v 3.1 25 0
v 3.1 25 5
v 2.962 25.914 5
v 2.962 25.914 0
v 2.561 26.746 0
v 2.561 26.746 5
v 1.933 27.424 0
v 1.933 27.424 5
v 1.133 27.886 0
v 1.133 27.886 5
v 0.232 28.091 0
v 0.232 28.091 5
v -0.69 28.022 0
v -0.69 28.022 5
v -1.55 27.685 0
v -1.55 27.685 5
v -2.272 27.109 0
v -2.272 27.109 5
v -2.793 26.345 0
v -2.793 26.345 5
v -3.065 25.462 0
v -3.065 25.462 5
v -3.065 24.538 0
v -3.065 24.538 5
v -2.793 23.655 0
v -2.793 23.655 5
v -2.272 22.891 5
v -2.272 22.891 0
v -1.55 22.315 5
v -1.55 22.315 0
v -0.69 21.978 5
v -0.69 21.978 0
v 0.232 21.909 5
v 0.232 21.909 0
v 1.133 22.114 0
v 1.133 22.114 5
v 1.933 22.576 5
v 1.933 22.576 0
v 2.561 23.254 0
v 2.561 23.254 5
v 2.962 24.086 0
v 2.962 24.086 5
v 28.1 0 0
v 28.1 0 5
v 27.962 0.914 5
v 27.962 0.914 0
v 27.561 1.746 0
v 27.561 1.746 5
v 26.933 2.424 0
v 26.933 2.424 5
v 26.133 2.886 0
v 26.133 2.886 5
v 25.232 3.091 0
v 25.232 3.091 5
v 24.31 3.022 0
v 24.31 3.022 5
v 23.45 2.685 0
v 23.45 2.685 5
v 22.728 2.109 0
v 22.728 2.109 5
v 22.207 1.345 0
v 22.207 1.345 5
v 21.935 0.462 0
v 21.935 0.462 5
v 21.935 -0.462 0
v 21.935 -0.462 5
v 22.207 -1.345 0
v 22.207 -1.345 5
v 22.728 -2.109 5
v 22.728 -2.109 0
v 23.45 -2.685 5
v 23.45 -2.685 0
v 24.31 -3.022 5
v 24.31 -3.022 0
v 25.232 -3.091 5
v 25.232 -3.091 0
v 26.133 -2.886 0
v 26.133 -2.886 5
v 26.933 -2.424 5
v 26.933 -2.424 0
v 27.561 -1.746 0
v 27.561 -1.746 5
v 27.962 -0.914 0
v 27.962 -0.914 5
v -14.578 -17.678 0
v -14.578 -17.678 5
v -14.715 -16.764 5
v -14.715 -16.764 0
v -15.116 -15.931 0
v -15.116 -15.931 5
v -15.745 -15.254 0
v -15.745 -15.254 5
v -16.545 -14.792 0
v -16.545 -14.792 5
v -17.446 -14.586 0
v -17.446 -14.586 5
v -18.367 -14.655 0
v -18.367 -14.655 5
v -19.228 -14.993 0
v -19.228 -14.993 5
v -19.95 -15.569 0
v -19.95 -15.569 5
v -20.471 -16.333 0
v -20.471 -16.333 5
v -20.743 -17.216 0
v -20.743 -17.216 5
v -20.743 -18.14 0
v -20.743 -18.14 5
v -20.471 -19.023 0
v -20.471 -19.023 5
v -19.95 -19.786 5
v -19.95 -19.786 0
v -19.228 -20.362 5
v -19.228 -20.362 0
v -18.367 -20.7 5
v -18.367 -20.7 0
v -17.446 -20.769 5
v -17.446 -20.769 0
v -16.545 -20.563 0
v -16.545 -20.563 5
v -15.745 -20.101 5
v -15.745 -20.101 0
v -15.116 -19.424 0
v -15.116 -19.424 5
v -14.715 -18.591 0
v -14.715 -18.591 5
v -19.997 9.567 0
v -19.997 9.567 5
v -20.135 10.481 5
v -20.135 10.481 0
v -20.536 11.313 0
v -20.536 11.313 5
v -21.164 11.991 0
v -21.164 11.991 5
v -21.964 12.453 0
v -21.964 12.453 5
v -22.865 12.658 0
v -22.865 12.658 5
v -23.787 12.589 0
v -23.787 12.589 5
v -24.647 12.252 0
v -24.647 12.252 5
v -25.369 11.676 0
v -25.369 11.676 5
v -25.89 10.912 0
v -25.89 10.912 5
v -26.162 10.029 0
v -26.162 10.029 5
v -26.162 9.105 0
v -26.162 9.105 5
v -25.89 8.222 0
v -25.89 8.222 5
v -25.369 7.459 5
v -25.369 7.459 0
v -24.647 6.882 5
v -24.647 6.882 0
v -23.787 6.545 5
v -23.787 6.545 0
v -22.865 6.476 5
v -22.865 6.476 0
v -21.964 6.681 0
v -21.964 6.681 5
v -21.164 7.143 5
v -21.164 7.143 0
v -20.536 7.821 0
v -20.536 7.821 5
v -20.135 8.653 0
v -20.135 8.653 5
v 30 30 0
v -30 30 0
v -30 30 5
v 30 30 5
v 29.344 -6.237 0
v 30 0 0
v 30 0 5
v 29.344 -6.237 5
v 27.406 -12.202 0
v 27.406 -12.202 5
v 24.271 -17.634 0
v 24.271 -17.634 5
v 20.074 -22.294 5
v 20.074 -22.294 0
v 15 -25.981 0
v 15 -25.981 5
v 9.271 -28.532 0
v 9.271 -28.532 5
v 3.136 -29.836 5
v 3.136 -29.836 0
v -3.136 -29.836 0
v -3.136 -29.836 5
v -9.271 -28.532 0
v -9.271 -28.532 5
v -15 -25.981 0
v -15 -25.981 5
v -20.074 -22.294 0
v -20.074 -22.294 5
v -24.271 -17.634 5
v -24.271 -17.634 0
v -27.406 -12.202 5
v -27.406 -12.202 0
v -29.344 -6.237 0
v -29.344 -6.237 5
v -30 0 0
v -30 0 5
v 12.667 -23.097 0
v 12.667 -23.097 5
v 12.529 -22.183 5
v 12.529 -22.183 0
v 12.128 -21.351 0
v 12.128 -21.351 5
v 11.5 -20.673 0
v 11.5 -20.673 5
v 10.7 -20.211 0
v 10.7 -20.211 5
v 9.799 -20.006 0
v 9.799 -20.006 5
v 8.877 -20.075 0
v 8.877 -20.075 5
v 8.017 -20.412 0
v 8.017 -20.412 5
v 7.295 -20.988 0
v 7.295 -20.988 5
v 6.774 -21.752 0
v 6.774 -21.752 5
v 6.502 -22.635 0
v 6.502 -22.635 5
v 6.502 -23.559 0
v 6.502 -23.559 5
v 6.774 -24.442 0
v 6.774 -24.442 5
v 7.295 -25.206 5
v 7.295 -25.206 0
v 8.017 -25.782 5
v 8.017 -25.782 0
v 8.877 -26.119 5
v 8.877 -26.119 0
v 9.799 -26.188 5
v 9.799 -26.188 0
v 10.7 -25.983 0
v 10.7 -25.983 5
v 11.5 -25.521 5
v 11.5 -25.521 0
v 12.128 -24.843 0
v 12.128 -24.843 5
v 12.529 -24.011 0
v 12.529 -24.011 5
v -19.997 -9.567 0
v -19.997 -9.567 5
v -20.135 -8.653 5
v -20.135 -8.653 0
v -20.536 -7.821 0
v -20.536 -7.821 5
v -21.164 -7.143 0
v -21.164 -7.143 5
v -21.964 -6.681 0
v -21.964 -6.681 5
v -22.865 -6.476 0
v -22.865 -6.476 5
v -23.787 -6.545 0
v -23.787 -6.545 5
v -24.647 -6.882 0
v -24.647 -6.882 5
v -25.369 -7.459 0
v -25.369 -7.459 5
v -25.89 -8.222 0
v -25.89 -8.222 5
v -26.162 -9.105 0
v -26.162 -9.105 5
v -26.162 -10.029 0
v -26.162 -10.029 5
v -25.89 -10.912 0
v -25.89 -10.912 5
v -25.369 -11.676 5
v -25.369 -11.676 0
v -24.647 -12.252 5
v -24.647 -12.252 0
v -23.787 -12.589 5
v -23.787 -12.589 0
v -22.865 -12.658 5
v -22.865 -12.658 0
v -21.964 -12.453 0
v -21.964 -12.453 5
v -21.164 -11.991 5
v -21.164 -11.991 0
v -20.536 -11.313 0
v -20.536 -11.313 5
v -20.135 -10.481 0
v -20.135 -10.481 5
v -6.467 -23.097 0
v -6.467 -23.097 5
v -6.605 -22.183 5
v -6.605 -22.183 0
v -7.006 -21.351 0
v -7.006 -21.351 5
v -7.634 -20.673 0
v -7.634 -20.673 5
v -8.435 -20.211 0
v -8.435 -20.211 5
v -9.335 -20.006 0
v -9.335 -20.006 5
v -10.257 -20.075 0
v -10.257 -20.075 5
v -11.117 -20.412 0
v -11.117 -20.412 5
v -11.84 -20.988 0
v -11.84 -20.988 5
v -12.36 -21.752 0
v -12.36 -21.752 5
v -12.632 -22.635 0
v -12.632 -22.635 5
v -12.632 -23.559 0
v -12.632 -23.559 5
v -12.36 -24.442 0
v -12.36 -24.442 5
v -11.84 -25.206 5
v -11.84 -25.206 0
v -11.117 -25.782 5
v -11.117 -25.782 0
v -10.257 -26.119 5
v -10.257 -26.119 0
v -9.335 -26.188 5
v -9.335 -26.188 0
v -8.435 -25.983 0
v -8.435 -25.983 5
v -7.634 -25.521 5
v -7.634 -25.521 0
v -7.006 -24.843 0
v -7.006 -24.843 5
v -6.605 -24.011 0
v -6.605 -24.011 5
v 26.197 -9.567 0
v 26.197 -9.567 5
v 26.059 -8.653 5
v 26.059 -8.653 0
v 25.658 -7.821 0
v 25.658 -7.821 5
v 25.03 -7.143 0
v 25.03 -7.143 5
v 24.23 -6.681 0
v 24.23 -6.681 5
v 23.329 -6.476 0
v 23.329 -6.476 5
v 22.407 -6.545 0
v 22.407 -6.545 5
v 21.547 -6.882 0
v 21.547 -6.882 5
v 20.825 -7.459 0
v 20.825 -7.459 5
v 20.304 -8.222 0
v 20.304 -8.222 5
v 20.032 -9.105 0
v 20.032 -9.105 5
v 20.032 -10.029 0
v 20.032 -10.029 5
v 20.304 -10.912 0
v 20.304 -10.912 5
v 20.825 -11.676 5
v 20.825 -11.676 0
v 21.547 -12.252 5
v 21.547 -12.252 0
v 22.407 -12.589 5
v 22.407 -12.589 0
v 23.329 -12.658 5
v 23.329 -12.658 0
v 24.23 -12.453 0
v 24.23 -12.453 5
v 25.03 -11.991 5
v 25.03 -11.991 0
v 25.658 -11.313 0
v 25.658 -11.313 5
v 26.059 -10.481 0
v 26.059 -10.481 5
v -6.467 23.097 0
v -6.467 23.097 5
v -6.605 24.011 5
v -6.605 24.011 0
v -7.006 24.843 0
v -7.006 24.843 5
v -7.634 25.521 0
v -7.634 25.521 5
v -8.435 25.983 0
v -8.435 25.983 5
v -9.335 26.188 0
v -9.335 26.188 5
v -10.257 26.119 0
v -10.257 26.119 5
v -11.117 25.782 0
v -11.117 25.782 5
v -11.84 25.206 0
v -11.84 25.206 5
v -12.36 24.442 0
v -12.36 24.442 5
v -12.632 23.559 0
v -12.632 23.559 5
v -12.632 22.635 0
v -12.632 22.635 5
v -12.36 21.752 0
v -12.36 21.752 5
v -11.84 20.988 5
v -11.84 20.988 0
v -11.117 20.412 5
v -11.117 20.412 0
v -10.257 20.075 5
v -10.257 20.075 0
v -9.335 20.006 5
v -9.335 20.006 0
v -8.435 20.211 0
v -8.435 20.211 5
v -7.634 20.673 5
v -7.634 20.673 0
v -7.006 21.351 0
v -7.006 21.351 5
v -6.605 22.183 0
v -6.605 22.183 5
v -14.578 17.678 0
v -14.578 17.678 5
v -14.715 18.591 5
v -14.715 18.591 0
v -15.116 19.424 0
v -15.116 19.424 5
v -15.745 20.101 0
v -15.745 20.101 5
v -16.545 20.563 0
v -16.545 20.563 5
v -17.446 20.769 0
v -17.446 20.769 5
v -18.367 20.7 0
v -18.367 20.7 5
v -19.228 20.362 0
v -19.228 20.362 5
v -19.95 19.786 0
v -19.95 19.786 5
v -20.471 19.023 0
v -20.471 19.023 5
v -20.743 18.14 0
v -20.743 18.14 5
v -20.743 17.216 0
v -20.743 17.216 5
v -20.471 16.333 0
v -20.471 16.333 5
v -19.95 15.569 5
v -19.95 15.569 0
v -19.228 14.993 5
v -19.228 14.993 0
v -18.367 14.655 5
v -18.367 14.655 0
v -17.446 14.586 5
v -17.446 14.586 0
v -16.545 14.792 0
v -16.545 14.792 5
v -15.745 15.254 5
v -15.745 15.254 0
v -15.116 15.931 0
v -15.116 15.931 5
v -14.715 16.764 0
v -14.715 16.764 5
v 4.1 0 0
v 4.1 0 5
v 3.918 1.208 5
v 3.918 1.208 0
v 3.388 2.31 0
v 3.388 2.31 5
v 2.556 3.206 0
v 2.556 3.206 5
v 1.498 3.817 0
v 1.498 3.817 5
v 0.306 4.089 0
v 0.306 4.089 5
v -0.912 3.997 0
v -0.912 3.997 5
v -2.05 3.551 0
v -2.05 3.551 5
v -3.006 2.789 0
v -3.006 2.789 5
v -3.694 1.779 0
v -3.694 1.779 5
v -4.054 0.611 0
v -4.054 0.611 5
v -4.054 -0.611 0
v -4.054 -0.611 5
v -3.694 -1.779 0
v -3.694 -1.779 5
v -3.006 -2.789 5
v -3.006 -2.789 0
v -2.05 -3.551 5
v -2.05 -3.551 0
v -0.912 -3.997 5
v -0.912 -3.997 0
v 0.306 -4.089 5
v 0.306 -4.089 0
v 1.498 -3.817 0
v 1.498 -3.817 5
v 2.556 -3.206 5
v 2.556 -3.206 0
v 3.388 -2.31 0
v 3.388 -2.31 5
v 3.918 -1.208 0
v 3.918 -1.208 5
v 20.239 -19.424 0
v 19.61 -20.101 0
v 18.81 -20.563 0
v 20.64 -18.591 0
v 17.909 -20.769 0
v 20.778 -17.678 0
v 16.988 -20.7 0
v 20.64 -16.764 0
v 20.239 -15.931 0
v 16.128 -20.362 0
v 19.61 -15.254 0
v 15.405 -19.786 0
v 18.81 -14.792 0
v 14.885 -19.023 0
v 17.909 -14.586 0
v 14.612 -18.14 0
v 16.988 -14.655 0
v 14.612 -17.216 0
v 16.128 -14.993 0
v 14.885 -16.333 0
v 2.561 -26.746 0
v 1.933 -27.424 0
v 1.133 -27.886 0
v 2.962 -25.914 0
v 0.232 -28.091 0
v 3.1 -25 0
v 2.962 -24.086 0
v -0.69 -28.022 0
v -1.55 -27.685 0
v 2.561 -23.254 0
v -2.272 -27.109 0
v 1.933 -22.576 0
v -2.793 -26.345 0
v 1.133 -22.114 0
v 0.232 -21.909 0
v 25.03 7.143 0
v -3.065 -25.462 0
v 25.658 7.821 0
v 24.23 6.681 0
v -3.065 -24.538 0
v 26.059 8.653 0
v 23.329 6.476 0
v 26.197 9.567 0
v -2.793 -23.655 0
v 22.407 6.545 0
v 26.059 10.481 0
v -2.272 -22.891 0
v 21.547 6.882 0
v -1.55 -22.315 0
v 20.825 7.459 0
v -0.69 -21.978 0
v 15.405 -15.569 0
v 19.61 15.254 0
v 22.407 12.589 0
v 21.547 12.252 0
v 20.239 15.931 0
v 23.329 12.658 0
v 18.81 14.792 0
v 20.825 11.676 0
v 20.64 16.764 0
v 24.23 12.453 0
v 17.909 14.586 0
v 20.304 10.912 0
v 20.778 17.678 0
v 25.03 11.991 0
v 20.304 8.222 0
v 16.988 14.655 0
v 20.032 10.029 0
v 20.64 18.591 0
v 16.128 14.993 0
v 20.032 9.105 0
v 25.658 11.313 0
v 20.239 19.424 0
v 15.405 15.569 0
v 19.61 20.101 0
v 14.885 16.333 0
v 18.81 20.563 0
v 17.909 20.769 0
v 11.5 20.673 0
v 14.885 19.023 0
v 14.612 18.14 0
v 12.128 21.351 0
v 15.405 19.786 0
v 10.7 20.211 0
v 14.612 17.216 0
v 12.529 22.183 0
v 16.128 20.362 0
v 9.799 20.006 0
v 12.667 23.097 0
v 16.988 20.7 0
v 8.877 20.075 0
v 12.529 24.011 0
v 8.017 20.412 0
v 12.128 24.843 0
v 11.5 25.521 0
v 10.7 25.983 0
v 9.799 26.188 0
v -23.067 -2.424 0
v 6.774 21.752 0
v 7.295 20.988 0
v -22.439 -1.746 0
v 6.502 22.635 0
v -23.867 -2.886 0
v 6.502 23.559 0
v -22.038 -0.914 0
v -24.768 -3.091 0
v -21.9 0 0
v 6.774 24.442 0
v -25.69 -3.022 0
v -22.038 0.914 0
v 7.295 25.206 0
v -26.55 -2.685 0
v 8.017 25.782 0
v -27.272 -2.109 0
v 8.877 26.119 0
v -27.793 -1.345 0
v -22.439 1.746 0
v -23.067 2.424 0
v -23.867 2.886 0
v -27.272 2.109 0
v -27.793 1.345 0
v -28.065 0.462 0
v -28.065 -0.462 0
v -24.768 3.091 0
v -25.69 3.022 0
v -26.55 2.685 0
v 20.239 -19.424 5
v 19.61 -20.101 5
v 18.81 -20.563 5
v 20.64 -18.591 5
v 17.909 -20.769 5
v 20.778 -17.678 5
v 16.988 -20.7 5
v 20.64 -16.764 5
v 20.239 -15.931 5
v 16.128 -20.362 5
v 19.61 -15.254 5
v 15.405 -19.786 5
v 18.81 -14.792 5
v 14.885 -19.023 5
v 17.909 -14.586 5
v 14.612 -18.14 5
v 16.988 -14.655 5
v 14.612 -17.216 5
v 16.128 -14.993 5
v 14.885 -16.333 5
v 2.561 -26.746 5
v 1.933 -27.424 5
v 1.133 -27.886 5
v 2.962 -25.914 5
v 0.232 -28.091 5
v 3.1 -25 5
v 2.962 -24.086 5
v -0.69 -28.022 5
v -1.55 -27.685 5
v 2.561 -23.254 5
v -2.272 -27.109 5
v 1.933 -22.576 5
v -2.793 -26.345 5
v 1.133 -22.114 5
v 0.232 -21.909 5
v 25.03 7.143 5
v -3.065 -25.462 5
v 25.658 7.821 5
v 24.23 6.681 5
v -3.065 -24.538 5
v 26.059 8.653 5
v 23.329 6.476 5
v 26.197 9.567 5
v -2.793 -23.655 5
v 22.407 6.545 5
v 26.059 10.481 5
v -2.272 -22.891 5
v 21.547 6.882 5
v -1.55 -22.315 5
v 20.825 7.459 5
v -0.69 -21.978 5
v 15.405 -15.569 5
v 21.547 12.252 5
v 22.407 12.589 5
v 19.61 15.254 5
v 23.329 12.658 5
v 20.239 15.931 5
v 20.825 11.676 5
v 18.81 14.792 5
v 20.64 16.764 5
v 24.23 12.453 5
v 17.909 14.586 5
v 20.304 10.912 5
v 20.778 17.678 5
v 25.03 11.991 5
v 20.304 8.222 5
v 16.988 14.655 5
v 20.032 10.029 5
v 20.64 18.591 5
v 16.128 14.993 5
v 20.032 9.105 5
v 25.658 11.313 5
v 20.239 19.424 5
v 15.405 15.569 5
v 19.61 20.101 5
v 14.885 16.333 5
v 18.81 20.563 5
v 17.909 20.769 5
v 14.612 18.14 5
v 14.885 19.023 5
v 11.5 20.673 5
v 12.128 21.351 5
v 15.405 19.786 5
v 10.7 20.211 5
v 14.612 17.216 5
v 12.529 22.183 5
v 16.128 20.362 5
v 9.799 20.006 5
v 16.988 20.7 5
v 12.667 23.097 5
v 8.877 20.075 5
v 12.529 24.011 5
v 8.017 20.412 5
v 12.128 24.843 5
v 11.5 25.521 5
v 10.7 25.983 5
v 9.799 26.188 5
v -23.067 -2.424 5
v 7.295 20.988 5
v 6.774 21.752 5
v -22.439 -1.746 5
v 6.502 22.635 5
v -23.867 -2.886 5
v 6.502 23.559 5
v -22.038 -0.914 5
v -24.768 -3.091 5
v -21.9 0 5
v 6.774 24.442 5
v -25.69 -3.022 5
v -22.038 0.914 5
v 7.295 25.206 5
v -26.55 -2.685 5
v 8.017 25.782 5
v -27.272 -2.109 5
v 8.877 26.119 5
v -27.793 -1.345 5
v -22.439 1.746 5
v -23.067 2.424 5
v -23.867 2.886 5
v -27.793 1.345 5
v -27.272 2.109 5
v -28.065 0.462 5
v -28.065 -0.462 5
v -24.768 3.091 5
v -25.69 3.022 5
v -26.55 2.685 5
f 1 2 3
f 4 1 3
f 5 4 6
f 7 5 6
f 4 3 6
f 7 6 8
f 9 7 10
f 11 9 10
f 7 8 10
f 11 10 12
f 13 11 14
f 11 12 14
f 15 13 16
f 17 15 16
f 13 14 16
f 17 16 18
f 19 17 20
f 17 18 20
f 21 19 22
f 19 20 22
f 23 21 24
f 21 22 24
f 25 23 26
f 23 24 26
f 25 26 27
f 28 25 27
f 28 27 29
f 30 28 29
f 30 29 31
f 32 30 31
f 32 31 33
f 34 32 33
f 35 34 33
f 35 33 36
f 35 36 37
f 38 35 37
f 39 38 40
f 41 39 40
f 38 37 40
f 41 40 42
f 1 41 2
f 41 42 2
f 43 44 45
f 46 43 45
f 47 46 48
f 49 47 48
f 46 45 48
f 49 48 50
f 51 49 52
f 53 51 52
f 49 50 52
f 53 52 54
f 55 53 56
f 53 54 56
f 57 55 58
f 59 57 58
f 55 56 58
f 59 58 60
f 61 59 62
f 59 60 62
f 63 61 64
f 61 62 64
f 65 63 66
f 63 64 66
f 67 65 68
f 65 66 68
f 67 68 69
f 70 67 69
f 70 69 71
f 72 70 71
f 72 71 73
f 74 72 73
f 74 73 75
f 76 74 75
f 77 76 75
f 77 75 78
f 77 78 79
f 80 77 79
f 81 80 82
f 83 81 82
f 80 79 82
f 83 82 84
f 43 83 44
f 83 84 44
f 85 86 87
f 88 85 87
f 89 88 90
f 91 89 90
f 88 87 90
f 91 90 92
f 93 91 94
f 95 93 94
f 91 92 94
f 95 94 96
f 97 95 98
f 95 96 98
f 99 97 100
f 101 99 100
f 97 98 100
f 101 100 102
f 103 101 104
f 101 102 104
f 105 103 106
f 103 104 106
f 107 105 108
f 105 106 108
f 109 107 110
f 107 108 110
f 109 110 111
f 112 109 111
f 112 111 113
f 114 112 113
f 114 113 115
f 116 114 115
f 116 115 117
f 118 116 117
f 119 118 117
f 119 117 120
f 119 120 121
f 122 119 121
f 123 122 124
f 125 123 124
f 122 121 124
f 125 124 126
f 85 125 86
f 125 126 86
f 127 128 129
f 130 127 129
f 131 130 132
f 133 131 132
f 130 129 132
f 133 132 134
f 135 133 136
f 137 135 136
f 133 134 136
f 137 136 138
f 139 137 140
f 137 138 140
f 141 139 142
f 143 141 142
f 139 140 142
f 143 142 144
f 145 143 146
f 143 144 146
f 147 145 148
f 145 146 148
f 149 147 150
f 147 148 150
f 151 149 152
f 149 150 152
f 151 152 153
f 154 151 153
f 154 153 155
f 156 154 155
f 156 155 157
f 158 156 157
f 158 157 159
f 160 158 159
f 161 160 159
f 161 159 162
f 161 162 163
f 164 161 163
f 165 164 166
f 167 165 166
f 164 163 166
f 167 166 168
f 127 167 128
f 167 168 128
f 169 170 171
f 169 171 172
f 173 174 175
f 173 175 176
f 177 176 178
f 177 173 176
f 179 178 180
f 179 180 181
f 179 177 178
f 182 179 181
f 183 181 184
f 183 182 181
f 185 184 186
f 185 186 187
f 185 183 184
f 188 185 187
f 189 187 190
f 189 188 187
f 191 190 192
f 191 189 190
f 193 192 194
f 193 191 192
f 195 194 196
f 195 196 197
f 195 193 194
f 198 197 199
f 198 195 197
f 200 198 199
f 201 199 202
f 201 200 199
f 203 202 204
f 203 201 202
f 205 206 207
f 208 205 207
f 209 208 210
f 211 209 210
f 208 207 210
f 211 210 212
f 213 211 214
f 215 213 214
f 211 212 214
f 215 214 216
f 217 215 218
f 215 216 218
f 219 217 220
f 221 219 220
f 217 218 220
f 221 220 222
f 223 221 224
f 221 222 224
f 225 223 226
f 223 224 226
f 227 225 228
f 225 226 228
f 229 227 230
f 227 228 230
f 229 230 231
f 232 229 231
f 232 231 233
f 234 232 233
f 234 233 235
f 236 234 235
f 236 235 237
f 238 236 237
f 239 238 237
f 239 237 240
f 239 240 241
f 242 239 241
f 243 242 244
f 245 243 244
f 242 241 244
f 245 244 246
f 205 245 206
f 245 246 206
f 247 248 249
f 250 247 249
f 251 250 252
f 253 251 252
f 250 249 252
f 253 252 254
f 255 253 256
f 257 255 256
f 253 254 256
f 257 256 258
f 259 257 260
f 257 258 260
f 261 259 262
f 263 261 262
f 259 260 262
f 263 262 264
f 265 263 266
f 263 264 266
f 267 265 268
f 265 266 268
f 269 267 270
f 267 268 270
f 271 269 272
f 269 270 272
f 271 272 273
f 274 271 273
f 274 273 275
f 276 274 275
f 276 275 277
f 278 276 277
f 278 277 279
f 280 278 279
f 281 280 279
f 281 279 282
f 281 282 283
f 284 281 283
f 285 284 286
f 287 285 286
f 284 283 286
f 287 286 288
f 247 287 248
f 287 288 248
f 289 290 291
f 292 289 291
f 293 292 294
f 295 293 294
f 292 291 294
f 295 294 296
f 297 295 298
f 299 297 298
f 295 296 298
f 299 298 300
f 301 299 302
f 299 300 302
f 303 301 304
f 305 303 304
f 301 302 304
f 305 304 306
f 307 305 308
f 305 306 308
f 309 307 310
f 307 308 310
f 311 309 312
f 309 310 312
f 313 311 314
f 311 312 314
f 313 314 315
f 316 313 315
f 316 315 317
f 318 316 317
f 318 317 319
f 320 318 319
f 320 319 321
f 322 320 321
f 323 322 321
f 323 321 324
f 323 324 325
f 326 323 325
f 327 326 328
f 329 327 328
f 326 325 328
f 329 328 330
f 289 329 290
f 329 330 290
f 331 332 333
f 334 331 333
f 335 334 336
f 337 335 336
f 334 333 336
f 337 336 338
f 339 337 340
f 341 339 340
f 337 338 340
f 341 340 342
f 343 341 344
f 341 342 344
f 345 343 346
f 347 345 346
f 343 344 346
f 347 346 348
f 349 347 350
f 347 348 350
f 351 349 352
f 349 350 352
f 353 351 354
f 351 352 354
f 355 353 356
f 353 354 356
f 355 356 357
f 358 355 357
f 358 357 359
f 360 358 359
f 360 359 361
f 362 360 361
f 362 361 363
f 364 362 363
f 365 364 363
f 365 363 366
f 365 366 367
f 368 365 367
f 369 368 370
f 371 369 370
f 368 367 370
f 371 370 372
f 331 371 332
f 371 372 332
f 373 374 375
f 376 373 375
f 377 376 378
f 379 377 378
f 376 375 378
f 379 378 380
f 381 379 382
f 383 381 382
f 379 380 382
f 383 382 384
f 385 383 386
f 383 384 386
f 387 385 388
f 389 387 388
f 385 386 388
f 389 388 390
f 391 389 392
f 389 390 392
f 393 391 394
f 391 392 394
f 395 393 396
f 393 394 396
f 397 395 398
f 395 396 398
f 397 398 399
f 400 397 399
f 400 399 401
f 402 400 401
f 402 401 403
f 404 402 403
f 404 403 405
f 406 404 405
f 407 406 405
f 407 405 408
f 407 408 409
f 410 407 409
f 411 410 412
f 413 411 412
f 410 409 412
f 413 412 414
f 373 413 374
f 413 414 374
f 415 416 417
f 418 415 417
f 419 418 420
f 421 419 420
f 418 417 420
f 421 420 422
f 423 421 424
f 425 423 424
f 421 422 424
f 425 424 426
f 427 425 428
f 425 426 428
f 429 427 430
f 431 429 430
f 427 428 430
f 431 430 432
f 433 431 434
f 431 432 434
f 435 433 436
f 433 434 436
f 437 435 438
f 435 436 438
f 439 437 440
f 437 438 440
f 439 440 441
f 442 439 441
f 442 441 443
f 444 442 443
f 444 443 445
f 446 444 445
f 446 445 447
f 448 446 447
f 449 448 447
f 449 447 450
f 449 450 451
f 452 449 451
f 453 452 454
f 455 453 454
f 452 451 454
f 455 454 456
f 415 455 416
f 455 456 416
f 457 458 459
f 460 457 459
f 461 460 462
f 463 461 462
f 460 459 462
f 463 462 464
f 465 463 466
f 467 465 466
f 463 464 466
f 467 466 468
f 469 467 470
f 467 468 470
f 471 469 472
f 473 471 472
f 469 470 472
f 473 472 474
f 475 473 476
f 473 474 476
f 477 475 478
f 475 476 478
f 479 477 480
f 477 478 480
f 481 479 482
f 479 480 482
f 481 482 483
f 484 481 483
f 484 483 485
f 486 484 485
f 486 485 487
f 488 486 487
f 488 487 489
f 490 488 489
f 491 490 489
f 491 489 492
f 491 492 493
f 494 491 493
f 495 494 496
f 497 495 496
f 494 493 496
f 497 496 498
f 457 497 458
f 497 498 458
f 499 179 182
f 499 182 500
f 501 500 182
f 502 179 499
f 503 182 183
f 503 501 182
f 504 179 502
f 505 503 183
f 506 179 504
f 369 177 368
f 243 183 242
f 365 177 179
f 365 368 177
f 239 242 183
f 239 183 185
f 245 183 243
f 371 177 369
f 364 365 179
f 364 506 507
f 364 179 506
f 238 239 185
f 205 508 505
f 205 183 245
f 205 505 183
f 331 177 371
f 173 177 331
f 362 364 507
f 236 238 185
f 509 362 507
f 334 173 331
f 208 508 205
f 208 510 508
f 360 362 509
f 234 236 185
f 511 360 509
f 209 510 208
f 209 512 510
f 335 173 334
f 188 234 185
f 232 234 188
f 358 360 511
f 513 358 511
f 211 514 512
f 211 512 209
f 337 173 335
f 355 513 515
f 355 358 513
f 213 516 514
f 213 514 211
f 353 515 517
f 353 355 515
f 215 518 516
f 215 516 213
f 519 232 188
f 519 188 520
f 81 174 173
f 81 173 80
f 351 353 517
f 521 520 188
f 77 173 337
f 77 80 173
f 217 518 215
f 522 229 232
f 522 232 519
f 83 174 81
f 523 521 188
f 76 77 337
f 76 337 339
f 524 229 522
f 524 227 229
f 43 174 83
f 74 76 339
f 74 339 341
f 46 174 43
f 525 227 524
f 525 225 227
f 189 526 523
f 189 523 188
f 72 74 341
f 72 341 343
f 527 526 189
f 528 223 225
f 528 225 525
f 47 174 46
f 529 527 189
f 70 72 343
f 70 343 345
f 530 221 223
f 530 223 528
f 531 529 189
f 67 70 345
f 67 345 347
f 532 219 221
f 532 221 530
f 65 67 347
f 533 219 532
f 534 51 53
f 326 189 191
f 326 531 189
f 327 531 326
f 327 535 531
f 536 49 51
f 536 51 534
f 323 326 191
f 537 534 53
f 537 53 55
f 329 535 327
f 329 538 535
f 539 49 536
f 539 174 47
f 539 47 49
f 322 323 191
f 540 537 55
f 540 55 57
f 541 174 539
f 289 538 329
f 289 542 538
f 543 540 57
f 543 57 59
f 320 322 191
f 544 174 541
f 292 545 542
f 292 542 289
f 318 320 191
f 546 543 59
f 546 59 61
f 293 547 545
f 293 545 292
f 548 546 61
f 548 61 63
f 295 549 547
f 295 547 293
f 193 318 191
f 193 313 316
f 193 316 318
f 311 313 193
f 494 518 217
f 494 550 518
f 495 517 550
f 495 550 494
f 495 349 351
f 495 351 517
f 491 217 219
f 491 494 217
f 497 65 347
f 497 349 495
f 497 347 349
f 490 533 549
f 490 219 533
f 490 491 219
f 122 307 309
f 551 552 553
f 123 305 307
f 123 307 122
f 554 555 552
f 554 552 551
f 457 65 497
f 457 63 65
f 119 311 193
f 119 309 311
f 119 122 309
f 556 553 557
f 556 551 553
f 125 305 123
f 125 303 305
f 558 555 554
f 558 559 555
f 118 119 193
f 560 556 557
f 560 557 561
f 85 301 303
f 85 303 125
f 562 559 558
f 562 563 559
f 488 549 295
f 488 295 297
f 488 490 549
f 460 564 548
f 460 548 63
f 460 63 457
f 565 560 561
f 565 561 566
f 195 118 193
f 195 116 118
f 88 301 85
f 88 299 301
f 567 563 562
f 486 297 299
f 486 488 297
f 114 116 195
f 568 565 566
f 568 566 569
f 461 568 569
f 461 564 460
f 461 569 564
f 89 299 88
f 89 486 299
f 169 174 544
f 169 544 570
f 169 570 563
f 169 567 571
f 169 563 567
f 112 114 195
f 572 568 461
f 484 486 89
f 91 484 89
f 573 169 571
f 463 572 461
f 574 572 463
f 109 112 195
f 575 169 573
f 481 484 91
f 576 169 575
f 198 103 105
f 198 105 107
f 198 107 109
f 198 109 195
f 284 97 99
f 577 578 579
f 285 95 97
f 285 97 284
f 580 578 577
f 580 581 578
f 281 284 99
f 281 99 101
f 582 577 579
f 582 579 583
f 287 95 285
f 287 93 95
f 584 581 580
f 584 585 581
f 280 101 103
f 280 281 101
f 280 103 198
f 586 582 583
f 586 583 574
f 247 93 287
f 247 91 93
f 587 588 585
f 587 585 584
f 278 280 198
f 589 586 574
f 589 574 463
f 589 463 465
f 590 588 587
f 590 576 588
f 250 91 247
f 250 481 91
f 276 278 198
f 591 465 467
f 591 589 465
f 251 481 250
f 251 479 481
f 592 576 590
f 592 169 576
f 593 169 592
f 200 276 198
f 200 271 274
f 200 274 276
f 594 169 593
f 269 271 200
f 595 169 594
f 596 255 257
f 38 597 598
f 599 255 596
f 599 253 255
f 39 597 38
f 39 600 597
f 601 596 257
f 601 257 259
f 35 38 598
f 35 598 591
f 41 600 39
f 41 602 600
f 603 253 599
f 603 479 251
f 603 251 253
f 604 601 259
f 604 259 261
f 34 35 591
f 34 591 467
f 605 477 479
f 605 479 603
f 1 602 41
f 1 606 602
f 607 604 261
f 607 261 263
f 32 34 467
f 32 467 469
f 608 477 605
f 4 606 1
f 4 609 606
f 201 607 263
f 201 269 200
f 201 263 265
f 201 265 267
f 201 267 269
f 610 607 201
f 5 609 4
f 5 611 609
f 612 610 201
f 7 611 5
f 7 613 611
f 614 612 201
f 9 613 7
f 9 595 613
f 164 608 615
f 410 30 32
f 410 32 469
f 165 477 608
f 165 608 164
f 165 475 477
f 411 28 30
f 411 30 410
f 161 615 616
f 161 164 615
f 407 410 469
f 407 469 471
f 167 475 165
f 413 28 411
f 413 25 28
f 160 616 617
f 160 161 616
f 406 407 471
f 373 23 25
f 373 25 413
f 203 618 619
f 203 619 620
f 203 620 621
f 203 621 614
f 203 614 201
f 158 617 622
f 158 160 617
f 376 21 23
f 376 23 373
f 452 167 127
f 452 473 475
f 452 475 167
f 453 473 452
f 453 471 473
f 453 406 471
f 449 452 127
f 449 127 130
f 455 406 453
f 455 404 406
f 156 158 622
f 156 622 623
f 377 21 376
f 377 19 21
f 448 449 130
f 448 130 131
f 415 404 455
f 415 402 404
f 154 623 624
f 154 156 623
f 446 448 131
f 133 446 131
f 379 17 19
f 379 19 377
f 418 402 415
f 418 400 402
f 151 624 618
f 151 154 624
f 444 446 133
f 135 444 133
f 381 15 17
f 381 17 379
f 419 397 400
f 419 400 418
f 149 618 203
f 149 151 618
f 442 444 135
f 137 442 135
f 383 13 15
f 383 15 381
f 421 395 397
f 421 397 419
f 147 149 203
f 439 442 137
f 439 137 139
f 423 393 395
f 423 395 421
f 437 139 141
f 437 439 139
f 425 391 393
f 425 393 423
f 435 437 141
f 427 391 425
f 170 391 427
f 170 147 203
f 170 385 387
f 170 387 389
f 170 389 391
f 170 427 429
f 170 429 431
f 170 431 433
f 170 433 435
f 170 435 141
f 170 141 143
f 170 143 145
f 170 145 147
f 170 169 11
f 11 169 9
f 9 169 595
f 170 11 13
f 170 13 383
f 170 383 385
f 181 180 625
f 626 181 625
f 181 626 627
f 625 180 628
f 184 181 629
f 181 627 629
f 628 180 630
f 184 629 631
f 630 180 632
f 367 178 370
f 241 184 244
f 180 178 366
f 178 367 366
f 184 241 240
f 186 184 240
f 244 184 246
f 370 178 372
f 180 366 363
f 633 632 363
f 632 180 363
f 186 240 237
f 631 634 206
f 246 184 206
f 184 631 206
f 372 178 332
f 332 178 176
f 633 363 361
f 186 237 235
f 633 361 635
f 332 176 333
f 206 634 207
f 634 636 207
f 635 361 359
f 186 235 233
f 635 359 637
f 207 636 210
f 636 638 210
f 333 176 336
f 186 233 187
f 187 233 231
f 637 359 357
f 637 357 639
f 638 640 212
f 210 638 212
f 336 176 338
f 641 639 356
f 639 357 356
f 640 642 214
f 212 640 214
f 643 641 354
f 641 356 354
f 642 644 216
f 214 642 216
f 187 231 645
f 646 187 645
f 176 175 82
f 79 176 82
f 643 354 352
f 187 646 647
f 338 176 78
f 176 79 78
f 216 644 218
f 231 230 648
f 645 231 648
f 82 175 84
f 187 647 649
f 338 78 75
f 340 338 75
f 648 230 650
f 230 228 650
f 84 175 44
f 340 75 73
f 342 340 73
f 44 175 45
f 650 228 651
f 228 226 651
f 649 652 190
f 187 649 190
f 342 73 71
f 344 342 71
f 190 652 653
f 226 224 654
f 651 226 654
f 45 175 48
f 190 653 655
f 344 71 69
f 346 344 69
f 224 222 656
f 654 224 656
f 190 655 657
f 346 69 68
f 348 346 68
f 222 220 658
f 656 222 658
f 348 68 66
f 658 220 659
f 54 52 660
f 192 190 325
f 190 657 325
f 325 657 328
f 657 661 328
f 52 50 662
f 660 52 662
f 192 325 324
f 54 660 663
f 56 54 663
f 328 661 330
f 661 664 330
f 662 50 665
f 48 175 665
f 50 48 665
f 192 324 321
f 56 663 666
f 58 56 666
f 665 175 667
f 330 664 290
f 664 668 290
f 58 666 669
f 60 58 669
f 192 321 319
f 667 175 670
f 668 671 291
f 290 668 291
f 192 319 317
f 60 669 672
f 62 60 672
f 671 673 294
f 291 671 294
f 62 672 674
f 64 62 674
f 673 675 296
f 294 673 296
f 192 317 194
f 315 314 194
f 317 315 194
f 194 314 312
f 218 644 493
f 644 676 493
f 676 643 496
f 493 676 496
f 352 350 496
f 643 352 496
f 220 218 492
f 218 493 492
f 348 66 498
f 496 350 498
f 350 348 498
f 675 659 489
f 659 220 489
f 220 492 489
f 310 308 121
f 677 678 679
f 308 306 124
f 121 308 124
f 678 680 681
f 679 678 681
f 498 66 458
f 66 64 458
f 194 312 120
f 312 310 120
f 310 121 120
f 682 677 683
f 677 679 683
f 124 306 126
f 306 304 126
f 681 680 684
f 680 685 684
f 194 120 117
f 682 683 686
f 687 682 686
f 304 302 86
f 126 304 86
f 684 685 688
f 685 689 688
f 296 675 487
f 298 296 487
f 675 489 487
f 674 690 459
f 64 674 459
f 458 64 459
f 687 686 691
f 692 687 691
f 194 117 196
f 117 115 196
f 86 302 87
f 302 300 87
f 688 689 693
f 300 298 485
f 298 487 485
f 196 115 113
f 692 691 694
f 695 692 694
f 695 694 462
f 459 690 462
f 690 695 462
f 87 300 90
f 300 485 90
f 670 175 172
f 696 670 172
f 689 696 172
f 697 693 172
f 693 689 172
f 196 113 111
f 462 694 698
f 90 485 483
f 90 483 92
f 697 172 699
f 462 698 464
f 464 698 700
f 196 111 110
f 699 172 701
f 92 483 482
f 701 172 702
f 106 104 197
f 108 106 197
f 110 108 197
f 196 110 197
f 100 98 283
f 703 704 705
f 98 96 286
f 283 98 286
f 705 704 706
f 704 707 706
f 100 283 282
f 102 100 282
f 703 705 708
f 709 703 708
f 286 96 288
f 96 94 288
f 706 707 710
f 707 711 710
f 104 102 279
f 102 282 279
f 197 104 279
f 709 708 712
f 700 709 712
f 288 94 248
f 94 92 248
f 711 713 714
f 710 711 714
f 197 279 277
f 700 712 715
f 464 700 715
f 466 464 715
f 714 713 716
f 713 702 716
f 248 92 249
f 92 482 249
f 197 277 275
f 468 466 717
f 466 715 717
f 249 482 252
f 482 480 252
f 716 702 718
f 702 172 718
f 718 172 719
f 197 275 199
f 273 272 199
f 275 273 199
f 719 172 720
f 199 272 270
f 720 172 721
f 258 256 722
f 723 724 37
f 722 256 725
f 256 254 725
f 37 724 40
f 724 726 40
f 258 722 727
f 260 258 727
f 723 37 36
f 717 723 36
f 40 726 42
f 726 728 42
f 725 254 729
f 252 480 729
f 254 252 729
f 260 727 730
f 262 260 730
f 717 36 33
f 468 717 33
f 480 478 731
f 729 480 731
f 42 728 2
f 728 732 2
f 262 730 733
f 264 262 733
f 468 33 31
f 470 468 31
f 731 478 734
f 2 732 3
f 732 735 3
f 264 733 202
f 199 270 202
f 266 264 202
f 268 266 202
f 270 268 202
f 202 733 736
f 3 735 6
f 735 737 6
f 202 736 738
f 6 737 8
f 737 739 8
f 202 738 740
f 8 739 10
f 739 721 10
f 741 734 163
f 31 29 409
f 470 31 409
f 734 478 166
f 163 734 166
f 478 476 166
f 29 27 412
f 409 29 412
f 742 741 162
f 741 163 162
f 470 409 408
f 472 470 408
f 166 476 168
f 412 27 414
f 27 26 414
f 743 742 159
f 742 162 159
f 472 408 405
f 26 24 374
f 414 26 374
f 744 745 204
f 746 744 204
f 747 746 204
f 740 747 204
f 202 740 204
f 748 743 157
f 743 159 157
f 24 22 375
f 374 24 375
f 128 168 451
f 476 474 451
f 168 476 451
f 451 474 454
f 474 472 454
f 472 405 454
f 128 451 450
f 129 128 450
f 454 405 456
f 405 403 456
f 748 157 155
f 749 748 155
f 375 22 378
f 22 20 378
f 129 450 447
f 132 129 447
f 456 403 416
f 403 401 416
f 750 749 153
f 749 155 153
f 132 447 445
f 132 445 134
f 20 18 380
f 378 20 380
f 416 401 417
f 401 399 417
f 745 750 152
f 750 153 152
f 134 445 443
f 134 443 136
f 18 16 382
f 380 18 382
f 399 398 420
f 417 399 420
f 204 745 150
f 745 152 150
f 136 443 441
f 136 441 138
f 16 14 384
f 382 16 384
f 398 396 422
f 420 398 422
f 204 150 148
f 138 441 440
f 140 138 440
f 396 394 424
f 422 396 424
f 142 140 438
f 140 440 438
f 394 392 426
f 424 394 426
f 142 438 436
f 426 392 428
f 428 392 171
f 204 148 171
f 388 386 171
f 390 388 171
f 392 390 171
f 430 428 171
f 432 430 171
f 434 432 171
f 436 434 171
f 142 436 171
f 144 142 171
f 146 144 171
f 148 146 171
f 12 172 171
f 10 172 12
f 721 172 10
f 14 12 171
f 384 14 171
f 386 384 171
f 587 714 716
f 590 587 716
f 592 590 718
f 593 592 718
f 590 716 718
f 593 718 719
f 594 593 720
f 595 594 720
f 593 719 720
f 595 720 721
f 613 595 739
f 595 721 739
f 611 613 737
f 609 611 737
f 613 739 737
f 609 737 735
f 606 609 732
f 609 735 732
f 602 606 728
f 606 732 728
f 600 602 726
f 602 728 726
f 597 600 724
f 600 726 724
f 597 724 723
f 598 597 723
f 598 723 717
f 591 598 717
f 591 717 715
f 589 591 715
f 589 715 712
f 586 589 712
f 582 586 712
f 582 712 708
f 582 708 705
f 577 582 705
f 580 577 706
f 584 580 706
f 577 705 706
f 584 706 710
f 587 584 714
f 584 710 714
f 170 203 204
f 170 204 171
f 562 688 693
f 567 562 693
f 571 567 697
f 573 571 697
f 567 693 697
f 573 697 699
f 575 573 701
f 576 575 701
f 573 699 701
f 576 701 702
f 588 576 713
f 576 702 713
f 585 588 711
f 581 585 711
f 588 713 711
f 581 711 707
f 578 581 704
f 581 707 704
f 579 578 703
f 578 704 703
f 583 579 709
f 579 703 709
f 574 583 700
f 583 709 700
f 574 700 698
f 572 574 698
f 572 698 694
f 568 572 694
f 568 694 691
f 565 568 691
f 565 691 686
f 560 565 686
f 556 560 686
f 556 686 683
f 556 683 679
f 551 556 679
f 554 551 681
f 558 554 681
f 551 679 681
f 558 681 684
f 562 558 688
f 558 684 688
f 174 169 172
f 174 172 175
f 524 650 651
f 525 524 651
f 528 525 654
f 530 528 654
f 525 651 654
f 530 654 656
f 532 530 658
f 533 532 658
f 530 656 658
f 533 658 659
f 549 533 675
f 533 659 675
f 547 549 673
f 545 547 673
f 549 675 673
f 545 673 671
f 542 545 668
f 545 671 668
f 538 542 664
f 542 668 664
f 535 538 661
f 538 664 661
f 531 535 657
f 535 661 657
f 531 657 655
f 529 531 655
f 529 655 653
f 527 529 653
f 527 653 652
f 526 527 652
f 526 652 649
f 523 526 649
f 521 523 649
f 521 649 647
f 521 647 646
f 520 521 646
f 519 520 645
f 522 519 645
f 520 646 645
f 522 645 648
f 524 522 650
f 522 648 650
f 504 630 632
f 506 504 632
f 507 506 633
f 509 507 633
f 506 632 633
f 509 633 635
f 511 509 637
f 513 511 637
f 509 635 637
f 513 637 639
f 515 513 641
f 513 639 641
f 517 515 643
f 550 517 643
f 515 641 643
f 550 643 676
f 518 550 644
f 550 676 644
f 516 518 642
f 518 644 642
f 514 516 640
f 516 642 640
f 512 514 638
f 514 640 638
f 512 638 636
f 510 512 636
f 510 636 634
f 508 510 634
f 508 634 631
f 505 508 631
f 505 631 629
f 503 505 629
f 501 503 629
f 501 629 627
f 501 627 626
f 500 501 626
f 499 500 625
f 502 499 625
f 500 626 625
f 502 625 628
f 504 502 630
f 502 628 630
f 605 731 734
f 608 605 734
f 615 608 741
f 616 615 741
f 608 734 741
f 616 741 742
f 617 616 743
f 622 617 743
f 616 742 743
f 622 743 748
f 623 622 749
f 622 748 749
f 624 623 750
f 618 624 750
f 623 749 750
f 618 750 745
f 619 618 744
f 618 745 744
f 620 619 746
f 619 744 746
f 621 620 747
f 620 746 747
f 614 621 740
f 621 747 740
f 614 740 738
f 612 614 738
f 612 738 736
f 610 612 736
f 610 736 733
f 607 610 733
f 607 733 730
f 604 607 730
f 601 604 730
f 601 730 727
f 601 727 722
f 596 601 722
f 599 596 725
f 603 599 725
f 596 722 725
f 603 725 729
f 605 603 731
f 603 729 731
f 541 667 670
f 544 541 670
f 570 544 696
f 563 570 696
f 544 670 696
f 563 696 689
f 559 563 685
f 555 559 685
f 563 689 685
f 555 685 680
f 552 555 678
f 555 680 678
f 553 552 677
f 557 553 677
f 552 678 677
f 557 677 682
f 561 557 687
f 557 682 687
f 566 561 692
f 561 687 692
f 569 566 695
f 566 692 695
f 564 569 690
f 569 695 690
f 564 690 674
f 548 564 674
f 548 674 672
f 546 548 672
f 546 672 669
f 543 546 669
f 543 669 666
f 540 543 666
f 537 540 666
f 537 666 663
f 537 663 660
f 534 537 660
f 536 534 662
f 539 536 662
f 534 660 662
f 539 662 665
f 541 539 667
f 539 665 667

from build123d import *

# Parameters (mm, degrees)
EXTRUDE_1_DEPTH     = 5
SKETCH_3_R          = 4.1
CUT_EXTRUDE_1_DEPTH = 5
SKETCH_5_R          = 3.1
CUT_EXTRUDE_2_DEPTH = 5


with BuildPart() as part:
    # 草图2 → 凸台-拉伸1 (new body)
    with BuildSketch(Plane.XY):
        with BuildLine():
            Line((-30, 30), (30, 30))
            Line((30, 30), (30, 0))
            ThreePointArc((30, 0), (0, -30), (-30, 0))
            Line((-30, 0), (-30, 30))
        make_face()
    extrude(amount=EXTRUDE_1_DEPTH)

    # 草图3 → 切除-拉伸1 (cut)
    with BuildSketch(Plane.XY.offset(5)):
        Circle(SKETCH_3_R)
    extrude(amount=-CUT_EXTRUDE_1_DEPTH, mode=Mode.SUBTRACT)

    # 草图5 → 切除-拉伸2 (cut)
    with BuildSketch(Plane.XY.offset(5)):
        with Locations((0, 25)):
            Circle(SKETCH_5_R)
        with Locations((9.567085809, 23.096988313)):
            Circle(SKETCH_5_R)
        with Locations((17.67766953, 17.67766953)):
            Circle(SKETCH_5_R)
        with Locations((23.096988313, 9.567085809)):
            Circle(SKETCH_5_R)
        with Locations((25, 0)):
            Circle(SKETCH_5_R)
        with Locations((23.096988313, -9.567085809)):
            Circle(SKETCH_5_R)
        with Locations((17.67766953, -17.67766953)):
            Circle(SKETCH_5_R)
        with Locations((9.567085809, -23.096988313)):
            Circle(SKETCH_5_R)
        with Locations((0, -25)):
            Circle(SKETCH_5_R)
        with Locations((-9.567085809, -23.096988313)):
            Circle(SKETCH_5_R)
        with Locations((-17.67766953, -17.67766953)):
            Circle(SKETCH_5_R)
        with Locations((-23.096988313, -9.567085809)):
            Circle(SKETCH_5_R)
        with Locations((-25, 0)):
            Circle(SKETCH_5_R)
        with Locations((-23.096988313, 9.567085809)):
            Circle(SKETCH_5_R)
        with Locations((-17.67766953, 17.67766953)):
            Circle(SKETCH_5_R)
        with Locations((-9.567085809, 23.096988313)):
            Circle(SKETCH_5_R)
    extrude(amount=-CUT_EXTRUDE_2_DEPTH, mode=Mode.SUBTRACT)


solid = part.part
